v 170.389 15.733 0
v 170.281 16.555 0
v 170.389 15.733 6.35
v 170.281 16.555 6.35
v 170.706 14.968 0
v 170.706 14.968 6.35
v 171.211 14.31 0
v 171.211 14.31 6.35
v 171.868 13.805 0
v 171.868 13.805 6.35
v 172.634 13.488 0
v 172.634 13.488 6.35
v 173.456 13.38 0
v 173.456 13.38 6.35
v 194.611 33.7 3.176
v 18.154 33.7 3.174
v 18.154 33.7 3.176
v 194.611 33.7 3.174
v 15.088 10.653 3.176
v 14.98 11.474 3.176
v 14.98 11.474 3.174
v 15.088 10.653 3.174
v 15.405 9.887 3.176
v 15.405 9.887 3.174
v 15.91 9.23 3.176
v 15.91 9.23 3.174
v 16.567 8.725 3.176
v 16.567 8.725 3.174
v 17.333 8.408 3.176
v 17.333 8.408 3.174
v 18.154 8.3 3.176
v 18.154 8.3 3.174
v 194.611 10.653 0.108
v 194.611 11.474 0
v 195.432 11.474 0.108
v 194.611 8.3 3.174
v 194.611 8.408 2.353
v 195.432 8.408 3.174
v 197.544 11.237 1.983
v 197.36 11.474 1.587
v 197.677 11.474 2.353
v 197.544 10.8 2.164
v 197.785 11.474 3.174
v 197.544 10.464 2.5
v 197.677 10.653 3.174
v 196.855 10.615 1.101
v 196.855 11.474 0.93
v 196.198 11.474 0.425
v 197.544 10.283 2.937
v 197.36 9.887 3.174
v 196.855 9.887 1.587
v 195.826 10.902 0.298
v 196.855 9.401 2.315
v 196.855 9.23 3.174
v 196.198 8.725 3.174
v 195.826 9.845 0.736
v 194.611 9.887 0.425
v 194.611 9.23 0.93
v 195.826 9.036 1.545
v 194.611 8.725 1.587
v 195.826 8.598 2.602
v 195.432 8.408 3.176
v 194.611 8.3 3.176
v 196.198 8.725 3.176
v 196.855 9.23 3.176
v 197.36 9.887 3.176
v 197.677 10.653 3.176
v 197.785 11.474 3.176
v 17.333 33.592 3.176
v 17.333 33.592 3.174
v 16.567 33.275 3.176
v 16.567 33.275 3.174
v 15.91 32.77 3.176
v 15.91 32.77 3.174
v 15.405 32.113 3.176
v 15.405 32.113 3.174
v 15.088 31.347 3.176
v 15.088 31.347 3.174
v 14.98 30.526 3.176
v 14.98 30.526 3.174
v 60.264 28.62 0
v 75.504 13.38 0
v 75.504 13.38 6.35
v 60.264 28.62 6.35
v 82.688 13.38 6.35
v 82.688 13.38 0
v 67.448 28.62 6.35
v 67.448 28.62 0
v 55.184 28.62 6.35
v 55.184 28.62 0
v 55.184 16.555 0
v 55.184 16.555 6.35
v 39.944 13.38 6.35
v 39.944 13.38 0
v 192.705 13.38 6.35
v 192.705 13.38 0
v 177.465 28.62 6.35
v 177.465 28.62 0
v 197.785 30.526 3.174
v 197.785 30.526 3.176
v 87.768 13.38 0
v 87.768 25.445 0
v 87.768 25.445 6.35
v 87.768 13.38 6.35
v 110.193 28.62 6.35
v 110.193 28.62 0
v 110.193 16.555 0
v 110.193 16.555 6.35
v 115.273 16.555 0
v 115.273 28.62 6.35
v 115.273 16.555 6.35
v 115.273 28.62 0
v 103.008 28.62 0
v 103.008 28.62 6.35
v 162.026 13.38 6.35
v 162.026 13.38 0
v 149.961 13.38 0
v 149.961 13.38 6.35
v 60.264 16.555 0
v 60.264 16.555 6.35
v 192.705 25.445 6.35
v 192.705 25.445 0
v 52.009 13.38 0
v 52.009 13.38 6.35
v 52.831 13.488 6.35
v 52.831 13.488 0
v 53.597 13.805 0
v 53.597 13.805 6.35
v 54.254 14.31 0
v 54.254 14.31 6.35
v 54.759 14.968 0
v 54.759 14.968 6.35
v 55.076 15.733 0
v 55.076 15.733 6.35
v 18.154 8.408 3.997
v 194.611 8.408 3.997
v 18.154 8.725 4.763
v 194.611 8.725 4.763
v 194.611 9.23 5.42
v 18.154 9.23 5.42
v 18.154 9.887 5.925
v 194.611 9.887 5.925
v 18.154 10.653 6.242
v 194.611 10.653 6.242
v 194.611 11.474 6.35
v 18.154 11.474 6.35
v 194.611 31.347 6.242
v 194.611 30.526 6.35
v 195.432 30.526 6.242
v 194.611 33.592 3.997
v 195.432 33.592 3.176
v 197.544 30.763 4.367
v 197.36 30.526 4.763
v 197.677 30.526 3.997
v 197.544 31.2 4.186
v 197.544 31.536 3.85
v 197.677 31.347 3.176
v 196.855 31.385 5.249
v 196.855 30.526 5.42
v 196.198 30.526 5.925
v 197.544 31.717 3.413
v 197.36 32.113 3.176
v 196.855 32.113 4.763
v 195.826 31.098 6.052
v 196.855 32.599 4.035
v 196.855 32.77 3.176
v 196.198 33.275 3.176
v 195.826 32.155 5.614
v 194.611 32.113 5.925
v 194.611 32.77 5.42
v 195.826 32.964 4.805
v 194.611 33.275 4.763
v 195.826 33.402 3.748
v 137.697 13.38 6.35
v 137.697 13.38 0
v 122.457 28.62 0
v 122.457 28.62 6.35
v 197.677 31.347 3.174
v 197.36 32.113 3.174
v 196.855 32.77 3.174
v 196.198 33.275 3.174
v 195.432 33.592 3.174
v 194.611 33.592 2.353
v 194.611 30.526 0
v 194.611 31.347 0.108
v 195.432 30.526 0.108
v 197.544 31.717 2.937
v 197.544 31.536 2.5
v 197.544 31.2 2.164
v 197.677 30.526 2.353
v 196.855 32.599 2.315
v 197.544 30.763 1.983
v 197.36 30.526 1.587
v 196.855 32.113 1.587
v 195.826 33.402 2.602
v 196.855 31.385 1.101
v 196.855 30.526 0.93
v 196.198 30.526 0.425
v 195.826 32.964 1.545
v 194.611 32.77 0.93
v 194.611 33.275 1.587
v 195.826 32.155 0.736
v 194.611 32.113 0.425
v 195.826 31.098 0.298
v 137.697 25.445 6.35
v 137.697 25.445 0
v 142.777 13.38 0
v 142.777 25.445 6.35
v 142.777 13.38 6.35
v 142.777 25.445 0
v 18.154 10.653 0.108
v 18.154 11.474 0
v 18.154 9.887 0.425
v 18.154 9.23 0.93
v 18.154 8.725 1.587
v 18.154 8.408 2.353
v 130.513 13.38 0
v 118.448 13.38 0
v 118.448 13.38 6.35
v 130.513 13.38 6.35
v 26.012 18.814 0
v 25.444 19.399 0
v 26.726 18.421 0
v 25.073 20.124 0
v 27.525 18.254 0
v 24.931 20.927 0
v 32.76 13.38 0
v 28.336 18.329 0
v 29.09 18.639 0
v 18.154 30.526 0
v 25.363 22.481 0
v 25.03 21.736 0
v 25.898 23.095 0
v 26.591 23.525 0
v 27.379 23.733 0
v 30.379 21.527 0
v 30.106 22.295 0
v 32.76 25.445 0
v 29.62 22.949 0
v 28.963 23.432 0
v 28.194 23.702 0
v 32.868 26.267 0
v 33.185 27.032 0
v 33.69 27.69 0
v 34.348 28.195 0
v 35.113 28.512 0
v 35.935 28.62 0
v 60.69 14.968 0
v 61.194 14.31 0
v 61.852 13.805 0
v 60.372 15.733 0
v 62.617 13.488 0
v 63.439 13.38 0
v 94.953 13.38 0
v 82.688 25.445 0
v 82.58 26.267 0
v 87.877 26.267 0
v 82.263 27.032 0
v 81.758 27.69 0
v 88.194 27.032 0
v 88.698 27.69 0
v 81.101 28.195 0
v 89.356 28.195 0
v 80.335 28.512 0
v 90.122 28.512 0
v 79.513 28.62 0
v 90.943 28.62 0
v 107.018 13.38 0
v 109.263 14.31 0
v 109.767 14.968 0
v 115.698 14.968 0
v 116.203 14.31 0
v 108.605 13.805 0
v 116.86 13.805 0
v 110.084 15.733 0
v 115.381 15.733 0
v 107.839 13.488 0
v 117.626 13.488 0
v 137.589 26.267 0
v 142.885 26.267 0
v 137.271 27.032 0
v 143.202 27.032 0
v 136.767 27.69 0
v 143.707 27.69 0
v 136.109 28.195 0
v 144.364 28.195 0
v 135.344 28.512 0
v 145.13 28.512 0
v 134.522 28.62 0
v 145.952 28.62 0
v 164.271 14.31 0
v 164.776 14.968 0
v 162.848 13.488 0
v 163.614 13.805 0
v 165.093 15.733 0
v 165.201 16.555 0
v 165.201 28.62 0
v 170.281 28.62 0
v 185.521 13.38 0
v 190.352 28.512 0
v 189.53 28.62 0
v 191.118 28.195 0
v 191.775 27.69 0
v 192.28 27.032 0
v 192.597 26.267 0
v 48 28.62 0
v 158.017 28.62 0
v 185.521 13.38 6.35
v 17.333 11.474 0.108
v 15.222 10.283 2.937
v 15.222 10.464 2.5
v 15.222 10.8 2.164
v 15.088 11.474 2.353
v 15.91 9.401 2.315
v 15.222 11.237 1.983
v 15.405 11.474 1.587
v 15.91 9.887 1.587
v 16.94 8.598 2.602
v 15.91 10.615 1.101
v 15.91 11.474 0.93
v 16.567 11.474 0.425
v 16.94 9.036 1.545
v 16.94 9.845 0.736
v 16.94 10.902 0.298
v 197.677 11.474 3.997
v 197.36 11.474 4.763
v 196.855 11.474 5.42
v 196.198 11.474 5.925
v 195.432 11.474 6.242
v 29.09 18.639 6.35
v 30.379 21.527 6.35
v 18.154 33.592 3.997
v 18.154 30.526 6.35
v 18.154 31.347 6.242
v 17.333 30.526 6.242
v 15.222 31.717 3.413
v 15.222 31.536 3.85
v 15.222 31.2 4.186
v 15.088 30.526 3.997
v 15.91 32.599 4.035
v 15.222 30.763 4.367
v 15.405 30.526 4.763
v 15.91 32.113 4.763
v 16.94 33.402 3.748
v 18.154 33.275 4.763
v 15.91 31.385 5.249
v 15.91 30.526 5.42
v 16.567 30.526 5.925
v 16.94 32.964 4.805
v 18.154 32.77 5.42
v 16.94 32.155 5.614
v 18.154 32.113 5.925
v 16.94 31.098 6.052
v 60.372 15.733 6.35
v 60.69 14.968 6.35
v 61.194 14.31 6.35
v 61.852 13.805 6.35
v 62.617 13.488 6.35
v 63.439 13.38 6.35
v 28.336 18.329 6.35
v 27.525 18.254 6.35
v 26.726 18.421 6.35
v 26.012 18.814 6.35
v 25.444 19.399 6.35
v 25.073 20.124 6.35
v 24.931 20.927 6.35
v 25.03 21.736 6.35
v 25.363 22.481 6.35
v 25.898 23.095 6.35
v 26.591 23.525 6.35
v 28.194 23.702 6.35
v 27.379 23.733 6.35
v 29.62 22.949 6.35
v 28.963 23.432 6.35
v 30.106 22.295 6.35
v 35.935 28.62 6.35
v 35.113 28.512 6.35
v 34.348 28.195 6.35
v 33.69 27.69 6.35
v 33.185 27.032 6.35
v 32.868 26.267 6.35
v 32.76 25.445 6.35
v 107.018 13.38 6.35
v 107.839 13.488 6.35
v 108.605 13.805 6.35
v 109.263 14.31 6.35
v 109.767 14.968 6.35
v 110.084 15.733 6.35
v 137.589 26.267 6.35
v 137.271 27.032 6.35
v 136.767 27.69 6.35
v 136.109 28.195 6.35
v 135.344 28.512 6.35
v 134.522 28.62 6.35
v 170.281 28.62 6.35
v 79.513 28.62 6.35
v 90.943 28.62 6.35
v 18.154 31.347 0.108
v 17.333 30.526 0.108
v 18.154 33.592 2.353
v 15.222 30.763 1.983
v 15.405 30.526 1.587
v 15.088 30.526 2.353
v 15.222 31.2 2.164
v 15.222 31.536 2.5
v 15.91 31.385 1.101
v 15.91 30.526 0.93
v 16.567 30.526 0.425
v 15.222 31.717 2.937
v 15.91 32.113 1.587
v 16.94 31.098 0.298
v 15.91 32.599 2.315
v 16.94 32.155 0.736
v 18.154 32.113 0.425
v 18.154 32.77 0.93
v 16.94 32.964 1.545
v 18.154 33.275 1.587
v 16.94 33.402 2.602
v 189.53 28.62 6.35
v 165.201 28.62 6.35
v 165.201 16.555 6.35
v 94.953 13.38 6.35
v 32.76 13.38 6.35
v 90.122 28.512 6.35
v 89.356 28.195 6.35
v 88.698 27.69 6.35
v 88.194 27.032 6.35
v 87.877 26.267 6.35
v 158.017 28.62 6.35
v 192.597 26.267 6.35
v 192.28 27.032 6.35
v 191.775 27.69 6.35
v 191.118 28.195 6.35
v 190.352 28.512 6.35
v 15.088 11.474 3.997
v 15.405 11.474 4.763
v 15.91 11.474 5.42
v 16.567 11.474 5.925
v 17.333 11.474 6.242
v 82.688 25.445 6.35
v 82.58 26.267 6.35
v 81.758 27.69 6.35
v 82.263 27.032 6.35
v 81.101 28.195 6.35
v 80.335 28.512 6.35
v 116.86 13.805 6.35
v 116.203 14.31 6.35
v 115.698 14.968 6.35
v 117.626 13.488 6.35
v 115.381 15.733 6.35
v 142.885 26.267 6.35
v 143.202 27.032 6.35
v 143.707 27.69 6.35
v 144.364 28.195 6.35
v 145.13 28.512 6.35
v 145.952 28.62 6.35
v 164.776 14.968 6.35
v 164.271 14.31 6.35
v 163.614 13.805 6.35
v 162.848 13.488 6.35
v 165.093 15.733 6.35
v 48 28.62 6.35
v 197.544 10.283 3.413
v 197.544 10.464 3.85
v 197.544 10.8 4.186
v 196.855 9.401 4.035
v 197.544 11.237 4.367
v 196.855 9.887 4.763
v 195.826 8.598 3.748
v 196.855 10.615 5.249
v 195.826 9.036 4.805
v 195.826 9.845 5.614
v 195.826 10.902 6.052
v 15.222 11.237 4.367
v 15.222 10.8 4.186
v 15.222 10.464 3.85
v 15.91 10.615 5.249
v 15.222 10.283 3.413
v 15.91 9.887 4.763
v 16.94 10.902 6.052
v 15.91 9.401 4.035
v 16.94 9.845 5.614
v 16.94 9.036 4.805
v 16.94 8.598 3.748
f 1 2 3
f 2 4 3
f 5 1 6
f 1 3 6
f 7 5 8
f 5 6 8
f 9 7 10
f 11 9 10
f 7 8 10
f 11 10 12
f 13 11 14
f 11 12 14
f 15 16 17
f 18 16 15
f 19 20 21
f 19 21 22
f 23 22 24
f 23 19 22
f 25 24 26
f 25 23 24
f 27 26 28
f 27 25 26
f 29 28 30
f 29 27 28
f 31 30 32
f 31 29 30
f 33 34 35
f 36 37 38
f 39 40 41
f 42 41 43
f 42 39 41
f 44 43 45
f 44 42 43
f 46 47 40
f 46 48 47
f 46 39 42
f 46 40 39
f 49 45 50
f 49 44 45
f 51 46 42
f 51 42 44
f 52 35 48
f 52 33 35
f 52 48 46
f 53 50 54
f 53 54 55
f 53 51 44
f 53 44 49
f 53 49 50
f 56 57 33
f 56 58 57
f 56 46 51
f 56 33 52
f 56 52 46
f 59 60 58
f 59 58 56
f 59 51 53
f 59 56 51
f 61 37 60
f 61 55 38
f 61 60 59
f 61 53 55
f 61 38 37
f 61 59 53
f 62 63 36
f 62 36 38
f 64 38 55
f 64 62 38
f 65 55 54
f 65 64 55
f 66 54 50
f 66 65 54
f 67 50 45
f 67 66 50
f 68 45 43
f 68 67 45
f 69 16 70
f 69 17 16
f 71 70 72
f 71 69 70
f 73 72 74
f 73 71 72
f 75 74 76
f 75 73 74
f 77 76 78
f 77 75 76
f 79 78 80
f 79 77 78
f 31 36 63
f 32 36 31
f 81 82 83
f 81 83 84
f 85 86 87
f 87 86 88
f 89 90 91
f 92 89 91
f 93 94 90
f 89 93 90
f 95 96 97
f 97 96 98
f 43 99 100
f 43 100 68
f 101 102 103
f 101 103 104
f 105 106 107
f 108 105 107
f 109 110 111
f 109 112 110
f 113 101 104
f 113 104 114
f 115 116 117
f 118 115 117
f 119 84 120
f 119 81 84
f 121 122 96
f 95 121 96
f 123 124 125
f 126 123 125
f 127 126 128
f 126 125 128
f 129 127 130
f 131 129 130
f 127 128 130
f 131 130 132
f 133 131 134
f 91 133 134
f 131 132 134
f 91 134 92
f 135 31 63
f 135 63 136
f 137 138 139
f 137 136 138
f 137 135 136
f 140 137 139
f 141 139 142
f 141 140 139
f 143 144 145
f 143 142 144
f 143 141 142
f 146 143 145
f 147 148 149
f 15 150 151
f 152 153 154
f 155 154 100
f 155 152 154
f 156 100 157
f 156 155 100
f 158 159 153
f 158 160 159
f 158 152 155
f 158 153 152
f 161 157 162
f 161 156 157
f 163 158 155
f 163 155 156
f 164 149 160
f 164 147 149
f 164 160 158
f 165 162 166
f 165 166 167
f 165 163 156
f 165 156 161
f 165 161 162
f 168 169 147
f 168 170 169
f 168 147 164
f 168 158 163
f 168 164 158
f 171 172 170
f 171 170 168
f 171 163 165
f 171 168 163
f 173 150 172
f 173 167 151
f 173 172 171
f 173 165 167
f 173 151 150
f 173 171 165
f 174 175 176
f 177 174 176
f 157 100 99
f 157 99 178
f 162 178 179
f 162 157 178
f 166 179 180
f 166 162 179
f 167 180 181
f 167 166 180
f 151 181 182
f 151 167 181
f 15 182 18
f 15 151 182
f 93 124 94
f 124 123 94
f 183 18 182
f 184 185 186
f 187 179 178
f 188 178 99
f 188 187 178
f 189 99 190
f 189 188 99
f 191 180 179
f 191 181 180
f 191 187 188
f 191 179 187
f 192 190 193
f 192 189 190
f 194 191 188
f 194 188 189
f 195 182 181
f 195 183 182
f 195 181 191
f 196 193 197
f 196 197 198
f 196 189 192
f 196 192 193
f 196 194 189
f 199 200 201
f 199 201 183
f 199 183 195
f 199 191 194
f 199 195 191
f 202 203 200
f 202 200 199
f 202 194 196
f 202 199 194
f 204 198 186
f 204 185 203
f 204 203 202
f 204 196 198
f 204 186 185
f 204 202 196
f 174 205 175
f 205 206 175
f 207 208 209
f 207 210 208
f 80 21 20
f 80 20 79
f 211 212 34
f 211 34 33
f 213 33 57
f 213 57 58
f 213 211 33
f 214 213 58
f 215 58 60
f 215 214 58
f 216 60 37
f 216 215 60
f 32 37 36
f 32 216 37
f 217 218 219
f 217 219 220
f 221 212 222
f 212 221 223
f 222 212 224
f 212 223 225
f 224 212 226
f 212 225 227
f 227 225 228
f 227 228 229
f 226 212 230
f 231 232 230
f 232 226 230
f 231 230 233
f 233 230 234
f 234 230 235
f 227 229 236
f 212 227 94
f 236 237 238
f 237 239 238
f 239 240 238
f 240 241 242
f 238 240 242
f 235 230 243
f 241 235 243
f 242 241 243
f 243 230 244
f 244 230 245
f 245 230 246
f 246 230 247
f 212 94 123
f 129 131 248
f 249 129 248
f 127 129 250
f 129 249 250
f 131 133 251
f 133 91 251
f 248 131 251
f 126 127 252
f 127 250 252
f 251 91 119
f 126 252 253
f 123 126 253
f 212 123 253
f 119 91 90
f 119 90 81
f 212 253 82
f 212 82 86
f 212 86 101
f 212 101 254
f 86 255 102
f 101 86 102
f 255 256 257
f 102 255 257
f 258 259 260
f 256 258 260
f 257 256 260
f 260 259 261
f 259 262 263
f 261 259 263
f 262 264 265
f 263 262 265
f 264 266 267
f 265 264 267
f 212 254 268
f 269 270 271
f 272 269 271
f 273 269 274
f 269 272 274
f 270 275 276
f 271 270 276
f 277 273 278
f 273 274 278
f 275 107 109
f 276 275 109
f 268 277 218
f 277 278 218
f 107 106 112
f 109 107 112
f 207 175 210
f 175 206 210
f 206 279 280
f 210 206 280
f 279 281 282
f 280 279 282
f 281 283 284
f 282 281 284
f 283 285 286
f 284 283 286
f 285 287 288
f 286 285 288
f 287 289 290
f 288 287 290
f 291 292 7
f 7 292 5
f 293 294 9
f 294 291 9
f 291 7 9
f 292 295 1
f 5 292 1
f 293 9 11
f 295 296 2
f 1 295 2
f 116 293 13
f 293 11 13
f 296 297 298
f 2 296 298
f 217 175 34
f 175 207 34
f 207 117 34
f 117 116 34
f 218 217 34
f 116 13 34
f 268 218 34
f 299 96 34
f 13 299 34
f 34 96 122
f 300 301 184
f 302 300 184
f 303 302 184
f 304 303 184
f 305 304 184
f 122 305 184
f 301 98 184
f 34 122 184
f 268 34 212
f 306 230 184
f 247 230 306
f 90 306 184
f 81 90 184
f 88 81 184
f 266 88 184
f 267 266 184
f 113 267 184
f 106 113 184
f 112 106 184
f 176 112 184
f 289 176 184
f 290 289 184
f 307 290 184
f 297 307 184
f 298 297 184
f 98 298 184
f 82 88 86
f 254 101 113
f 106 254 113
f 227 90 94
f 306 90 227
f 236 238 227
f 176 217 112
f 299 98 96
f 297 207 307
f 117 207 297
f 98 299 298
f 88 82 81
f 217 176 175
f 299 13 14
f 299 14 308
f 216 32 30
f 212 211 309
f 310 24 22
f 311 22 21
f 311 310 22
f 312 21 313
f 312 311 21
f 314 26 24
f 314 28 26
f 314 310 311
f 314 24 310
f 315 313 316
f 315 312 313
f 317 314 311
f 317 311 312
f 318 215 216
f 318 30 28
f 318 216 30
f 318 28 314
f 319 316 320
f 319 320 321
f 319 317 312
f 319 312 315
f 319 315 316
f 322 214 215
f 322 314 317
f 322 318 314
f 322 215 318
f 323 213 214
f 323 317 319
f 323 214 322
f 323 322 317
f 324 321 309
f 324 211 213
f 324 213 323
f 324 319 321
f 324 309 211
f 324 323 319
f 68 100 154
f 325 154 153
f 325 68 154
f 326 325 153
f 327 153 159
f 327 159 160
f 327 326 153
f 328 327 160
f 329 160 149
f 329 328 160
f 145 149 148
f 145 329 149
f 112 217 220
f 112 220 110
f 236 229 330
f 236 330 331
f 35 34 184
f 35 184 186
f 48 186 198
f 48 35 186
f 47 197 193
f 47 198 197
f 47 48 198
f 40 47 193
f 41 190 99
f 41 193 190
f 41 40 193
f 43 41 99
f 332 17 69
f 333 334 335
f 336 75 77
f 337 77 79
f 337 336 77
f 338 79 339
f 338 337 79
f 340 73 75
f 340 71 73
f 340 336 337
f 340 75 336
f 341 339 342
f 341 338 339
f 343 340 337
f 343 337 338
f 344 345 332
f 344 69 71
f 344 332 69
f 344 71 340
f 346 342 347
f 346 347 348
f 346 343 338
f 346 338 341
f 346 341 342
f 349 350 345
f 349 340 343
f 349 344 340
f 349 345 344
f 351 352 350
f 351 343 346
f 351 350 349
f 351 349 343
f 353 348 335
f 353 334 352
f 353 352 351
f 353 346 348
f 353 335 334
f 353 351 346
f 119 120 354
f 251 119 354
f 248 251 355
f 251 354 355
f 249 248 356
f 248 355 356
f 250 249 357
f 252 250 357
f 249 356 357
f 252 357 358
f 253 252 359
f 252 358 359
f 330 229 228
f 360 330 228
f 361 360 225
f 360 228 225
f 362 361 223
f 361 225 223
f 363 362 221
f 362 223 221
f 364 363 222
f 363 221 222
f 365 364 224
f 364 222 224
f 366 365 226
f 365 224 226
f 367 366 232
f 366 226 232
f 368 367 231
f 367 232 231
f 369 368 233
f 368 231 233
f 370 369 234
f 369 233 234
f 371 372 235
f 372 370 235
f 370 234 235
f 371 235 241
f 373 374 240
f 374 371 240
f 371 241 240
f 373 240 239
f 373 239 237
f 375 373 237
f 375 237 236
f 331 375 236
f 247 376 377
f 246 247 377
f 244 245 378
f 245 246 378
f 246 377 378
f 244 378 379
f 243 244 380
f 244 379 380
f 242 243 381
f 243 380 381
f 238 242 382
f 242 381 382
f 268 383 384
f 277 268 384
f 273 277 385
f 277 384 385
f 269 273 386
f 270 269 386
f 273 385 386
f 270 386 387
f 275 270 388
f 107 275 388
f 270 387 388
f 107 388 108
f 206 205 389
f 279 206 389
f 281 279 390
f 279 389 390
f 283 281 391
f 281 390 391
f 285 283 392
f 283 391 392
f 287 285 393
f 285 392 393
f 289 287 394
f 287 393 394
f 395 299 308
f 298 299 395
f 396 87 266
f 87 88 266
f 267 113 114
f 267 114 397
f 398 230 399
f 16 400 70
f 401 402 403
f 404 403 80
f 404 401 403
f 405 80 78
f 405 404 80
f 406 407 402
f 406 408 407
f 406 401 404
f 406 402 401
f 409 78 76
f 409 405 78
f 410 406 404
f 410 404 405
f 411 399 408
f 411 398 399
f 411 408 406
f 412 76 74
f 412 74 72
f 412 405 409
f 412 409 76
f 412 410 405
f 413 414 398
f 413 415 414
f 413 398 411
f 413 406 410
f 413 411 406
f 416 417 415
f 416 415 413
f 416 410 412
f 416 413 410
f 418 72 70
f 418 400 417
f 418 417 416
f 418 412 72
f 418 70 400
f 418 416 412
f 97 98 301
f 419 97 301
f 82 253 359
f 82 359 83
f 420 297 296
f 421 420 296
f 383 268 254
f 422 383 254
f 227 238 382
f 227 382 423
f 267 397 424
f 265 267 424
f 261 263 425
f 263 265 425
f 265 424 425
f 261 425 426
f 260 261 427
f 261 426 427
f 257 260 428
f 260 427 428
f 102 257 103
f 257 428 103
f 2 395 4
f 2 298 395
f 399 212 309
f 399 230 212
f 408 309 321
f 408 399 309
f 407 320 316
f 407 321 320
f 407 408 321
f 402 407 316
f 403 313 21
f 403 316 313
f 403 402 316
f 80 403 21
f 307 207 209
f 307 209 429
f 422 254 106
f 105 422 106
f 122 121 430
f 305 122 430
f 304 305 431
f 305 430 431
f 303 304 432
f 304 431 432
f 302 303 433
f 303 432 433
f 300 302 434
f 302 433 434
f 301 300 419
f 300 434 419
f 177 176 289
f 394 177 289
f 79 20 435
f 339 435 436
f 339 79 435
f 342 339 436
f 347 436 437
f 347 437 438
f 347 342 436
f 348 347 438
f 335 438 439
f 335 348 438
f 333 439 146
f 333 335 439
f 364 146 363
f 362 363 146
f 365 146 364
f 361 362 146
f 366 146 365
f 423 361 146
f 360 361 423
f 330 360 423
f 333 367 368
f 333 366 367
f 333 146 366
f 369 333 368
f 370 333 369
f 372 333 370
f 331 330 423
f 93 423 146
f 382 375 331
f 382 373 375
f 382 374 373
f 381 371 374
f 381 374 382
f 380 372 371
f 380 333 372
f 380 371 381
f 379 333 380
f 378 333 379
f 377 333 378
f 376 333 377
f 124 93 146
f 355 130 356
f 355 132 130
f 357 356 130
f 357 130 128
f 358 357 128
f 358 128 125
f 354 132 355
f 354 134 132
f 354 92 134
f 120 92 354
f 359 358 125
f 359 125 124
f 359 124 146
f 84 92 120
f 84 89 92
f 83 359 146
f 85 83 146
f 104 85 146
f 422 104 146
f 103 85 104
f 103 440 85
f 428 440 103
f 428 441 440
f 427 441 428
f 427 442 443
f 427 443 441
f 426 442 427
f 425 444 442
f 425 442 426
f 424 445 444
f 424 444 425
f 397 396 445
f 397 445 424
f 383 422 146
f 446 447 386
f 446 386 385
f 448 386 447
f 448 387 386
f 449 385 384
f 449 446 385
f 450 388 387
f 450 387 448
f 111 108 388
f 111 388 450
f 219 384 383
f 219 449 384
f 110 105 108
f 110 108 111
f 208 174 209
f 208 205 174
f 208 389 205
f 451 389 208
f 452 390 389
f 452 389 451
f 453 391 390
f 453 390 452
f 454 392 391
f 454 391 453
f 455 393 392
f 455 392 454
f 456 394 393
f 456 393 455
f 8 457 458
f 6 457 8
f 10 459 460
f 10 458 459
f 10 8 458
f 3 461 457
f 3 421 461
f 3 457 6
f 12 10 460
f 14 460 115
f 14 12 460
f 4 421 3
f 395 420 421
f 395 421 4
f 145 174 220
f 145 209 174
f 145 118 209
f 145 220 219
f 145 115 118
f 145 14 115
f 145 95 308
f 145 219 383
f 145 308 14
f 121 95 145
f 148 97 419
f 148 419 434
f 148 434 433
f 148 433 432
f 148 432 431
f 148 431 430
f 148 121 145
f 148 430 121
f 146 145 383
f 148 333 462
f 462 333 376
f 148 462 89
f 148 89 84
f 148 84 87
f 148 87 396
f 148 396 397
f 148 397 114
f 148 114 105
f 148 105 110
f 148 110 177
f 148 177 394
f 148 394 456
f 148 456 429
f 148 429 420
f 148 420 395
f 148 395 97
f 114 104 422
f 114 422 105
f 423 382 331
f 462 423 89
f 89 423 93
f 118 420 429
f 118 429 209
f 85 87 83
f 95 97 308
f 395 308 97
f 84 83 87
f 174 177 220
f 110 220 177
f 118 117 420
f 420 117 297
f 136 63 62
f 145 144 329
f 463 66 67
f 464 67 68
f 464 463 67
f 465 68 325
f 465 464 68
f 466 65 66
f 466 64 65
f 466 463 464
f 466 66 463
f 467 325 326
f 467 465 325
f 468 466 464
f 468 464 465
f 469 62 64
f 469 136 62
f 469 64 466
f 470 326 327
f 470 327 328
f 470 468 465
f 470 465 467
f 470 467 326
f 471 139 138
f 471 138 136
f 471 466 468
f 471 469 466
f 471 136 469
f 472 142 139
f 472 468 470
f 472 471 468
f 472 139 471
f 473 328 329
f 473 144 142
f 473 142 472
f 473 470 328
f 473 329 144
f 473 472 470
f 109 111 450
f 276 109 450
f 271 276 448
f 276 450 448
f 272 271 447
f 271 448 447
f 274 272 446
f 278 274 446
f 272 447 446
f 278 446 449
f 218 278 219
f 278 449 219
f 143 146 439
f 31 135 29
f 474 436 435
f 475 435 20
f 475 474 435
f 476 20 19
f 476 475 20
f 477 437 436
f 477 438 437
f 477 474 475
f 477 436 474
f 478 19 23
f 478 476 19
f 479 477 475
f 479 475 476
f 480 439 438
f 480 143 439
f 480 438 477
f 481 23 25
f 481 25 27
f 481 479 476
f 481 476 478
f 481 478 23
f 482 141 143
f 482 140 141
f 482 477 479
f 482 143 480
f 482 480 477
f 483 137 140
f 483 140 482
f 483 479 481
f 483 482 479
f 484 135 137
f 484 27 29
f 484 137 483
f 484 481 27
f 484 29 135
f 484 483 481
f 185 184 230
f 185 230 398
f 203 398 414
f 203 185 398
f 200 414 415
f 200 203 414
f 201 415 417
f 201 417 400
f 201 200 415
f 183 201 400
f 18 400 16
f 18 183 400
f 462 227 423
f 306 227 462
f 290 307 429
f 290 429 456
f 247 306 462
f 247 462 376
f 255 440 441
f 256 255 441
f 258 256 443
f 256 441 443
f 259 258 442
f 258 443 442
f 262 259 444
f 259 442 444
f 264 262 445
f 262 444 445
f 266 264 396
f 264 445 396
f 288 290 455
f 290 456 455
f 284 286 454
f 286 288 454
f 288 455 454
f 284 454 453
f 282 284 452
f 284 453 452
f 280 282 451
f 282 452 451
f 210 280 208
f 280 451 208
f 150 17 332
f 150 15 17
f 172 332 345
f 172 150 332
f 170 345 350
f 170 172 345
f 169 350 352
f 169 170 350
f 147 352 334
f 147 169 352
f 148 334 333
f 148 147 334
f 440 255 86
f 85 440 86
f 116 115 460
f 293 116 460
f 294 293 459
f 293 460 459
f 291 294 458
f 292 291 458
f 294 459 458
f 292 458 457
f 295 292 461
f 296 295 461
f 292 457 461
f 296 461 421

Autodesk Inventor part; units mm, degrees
ref_plane "YZ Plane" through (0, 0, 0) normal (1, 0, 0) x (0, 1, 0)
ref_plane "XZ Plane" through (0, 0, 0) normal (0, 1, 0) x (-1, 0, 0)
ref_plane "XY Plane" through (0, 0, 0) normal (0, 0, 1) x (1, 0, 0)
sketch "Sketch1" plane through (0, 0, 0) normal (0, 0, 1) x (1, 0, 0)
  line L0 (14.98, 33.7) -> (197.7852, 33.7)
  line L1 (197.7852, 8.3) -> (14.98, 8.3)
  line L2 (14.98, 8.3) -> (14.98, 33.7)
  arc A0 (30.1177, 21.5547) -> (28.8951, 18.8151) centre (27.68, 21) ccw construction
  line L3 (30.1177, 21.5547) -> (28.8951, 18.8151) construction
  line L4 (-3.175, 42) -> (-122.9515, 42) projected
  line L5 (137.6968, 28.62) -> (137.6968, 13.38)
  line L6 (137.6968, 13.38) -> (122.4568, 28.62)
  line L7 (122.4568, 28.62) -> (137.6968, 28.62)
  line L8 (130.5126, 13.38) -> (115.2726, 28.62)
  line L9 (115.2726, 28.62) -> (115.2726, 13.38)
  line L10 (115.2726, 13.38) -> (130.5126, 13.38)
  line L11 (112.7326, 10.7487) -> (112.7326, 41.4812) construction
  line L12 (87.7684, 28.62) -> (87.7684, 13.38)
  line L13 (87.7684, 13.38) -> (103.0084, 28.62)
  line L14 (103.0084, 28.62) -> (87.7684, 28.62)
  line L15 (94.9526, 13.38) -> (110.1926, 28.62)
  line L16 (110.1926, 28.62) -> (110.1926, 13.38)
  line L17 (110.1926, 13.38) -> (94.9526, 13.38)
  line L18 (85.2284, 8.9371) -> (85.2284, 32.7241) construction
  line L19 (32.76, 28.62) -> (32.76, 13.38)
  line L20 (32.76, 13.38) -> (48, 28.62)
  line L21 (48, 28.62) -> (32.76, 28.62)
  line L22 (39.9442, 13.38) -> (55.1842, 28.62)
  line L23 (55.1842, 28.62) -> (55.1842, 13.38)
  line L24 (55.1842, 13.38) -> (39.9442, 13.38)
  line L25 (82.6884, 28.62) -> (82.6884, 13.38)
  line L26 (82.6884, 13.38) -> (67.4484, 28.62)
  line L27 (67.4484, 28.62) -> (82.6884, 28.62)
  line L28 (75.5042, 13.38) -> (60.2642, 28.62)
  line L29 (60.2642, 13.38) -> (75.5042, 13.38)
  line L30 (60.2642, 28.62) -> (60.2642, 13.38)
  line L31 (140.2368, 33.7) -> (140.2368, 8.3) construction
  line L32 (142.7768, 28.62) -> (142.7768, 13.38)
  line L33 (142.7768, 13.38) -> (158.0168, 28.62)
  line L34 (158.0168, 28.62) -> (142.7768, 28.62)
  line L35 (149.961, 13.38) -> (165.201, 28.62)
  line L36 (165.201, 28.62) -> (165.201, 13.38)
  line L37 (165.201, 13.38) -> (149.961, 13.38)
  line L38 (192.7052, 28.62) -> (192.7052, 13.38)
  line L39 (192.7052, 13.38) -> (177.4652, 28.62)
  line L40 (177.4652, 28.62) -> (192.7052, 28.62)
  line L41 (185.521, 13.38) -> (170.281, 28.62)
  line L42 (170.281, 13.38) -> (185.521, 13.38)
  line L43 (170.281, 28.62) -> (170.281, 13.38)
  line L44 (197.7852, 33.7) -> (197.7852, 8.3)
  arc A1 (30.379, 21.5269) -> (29.0903, 18.6392) centre (27.68, 21) ccw
  line L45 (29.0903, 18.6392) -> (30.379, 21.5269)
  point P0 (0, 0)
  dimension "d0" = 12.7
  dimension "d1" = 12.7
  dimension "d2" = 12.7
  dimension "d7" = 45
  dimension "d9" = 5.08
  dimension "d10" = 5.08
  dimension "d11" = 5.08
  dimension "d12" = 0
  dimension "d14" = 2.54
  dimension "d15" = 2.54
  dimension "d16" = 5.08
  dimension "d23" = 2.54
  dimension "d24" = 5.08
  dimension "d29" = 5.5
  dimension "d30" = 2.5
  dimension "d31" = 0.25
extrude "Extrusion4" add sketch "Sketch1" along normal blind 6.35
fillet "Fillet7" radius 3.175 12 edges at (106.3826, 8.3, 6.35) (106.3826, 8.3, 0) (106.3826, 33.7, 0) (106.3826, 33.7, 6.35) (197.7852, 21, 6.35) (197.7852, 21, 0) (197.7852, 33.7, 3.175) (197.7852, 8.3, 3.175) (14.98, 21, 6.35) (14.98, 21, 0) (14.98, 8.3, 3.175) (14.98, 33.7, 3.175)
fillet "Fillet8" radius 3.175 12 edges at (55.1842, 13.38, 3.175) (60.2642, 13.38, 3.175) (32.76, 28.62, 3.175) (82.6884, 28.62, 3.175) (87.7684, 28.62, 3.175) (110.1926, 13.38, 3.175) (115.2726, 13.38, 3.175) (137.6968, 28.62, 3.175) (142.7768, 28.62, 3.175) (165.201, 13.38, 3.175) (170.281, 13.38, 3.175) (192.7052, 28.62, 3.175)
equation "\"d1\" = d0"
equation "\"d24\" = d9"
properties part number "endarm"
